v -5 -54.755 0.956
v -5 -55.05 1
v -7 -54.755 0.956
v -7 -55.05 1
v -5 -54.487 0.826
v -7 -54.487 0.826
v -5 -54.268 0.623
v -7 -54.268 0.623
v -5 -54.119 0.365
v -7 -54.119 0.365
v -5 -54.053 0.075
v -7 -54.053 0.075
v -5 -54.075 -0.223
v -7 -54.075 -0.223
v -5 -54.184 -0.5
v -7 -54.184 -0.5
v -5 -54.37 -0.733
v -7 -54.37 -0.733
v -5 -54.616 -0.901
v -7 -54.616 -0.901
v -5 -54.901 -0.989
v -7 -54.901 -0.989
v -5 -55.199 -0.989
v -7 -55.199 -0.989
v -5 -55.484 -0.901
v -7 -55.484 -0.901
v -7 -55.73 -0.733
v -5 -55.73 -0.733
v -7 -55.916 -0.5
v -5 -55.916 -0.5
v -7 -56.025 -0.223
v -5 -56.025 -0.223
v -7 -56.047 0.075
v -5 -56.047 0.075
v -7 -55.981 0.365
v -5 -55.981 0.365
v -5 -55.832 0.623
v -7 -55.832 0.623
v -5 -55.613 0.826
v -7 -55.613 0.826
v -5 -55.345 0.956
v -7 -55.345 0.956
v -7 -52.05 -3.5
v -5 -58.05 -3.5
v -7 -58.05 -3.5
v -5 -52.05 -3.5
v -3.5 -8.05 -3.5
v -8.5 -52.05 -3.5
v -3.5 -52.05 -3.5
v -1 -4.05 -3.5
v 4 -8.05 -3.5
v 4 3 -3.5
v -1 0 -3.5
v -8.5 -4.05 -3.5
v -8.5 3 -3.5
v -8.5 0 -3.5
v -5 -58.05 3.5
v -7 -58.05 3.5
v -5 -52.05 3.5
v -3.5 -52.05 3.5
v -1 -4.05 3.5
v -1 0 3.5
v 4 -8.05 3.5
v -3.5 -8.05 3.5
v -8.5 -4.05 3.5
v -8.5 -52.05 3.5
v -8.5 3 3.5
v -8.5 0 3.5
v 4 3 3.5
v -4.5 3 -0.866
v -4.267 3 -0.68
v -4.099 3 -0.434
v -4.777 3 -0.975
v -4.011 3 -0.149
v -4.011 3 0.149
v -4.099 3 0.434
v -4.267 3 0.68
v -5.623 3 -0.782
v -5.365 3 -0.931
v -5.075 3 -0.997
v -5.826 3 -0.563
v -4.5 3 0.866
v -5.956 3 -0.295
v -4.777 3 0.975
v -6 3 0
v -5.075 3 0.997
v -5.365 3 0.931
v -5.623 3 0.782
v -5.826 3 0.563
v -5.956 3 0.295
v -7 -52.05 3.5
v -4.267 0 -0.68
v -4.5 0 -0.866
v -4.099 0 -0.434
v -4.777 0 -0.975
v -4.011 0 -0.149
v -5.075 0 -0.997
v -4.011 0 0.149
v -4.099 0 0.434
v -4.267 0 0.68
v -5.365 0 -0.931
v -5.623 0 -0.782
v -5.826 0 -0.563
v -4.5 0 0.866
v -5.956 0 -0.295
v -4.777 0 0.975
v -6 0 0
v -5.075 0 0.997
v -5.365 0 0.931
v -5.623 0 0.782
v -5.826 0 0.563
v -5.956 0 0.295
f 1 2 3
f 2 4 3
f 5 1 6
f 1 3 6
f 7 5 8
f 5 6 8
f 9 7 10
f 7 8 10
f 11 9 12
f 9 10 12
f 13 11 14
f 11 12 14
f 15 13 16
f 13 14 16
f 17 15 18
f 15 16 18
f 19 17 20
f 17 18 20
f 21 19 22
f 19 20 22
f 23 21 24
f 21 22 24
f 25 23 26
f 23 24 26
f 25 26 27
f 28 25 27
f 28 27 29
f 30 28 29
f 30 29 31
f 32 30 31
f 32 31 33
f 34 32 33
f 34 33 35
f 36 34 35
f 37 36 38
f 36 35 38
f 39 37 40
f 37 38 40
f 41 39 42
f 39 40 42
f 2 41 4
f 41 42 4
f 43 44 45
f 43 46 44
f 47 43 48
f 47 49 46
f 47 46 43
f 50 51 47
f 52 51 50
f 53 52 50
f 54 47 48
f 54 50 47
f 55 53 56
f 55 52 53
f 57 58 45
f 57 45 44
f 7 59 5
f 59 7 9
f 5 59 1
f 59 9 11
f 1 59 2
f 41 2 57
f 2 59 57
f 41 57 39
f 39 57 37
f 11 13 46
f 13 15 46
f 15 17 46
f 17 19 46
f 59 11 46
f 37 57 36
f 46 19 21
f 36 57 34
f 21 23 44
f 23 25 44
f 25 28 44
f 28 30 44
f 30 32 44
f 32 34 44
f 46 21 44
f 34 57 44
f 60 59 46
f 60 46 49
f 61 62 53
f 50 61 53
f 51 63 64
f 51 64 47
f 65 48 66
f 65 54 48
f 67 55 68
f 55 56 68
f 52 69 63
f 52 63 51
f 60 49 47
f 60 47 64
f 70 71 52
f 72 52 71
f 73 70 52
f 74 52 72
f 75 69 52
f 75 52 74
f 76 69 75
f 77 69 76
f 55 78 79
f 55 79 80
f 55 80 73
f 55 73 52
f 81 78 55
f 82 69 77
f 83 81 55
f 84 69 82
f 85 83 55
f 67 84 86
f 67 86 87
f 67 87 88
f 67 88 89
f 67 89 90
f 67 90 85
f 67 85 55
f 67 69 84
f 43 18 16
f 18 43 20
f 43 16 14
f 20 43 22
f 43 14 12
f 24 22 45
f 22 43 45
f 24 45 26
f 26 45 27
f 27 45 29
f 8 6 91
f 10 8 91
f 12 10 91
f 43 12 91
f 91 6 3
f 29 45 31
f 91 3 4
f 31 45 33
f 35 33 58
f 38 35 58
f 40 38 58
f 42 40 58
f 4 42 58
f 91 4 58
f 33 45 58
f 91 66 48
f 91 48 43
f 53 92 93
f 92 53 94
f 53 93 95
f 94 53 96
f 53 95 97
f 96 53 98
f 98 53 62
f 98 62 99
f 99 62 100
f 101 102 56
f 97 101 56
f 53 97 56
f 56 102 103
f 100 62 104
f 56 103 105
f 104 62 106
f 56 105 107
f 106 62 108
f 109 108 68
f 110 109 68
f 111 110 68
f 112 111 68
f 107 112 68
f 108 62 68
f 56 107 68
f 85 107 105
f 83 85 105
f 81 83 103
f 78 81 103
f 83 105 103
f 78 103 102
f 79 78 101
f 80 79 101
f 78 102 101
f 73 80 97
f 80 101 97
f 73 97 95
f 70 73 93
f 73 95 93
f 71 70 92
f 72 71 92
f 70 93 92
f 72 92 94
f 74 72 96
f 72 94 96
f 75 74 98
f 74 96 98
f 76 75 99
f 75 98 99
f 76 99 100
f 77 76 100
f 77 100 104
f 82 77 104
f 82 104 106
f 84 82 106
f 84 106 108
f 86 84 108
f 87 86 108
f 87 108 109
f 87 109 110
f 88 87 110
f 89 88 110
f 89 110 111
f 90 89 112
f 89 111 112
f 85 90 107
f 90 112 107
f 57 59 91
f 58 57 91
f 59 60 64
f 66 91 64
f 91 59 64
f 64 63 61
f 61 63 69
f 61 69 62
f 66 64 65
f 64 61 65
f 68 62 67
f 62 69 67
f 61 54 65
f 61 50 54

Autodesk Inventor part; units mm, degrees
ref_plane "YZ Plane" through (0, 0, 0) normal (1, 0, 0) x (0, 1, 0)
ref_plane "XZ Plane" through (0, 0, 0) normal (0, 1, 0) x (-1, 0, 0)
ref_plane "XY Plane" through (0, 0, 0) normal (0, 0, 1) x (1, 0, 0)
sketch "Sketch1" plane through (0, 0, 0) normal (0, 1, 0) x (-1, 0, 0)
  line L0 (10, 3.5) -> (-4, 3.5)
  line L1 (-4, 3.5) -> (-4, -3.5)
  line L2 (-4, -3.5) -> (10, -3.5)
  line L3 (10, -3.5) -> (10, 3.5)
  line L4 (12.8, 0) -> (-6.8, 0) projected
  line L5 (0, -4.9) -> (0, 4.9) projected
  circle A0 centre (5, 0) radius 1
  dimension "d13" = 4
  dimension "d14" = 5
  dimension "d15" = 10
  dimension "d16" = 3.5
  dimension "d17" = 3.5
  dimension "d18" = 2
extrude "Extrusion4" add sketch "Sketch1" along normal blind 3 contours L3 L4 A0 L5 L0 | L5 L4 L1 L0 | L3 L2 L5 L4 A0 | L5 L2 L1 L4
sketch "Sketch3" plane through (0, 0, 0) normal (0, -1, 0) x (1, 0, 0)
  line L0 (4, -3.5) -> (-10, -3.5) projected
  line L1 (4, 3.5) -> (4, -3.5) projected
  line L2 (4, 3.5) -> (-1, 3.5)
  line L3 (-1, 3.5) -> (-1, -3.5)
  line L4 (-1, -3.5) -> (4, -3.5)
  line L5 (4, -3.5) -> (4, 3.5)
  point P0 (0, 0)
  dimension "d21" = 5
extrude "Extrusion5" add sketch "Sketch3" along normal blind 50
sketch "Sketch5" plane through (0, -50, 0) normal (0, -1, 0) x (1, 0, 0)
  line L0 (4, 3.5) -> (-1, 3.5) projected
  line L1 (-1, 3.5) -> (-1, -3.5) projected
  line L2 (-1, -3.5) -> (4, -3.5) projected
  line L3 (4, -3.5) -> (4, 3.5) projected
  line L4 (2.5, 3.5) -> (0.5, 3.5)
  line L5 (0.5, 3.5) -> (0.5, -3.5)
  line L6 (0.5, -3.5) -> (2.5, -3.5)
  line L7 (2.5, -3.5) -> (2.5, 3.5)
  point P0 (0, 0)
  dimension "d29" = 1.5
  dimension "d30" = 1.5
extrude "Extrusion7" add sketch "Sketch5" along normal blind 6 contours L7 L2 L5 L0
sketch "Sketch6" plane through (2.5, -50, 3.5) normal (1, 0, 0) x (0, 0, -1)
  circle A0 centre (3.5, -3) radius 1
  line L0 (7, 0) -> (0, 0) projected
  line L1 (0, 0) -> (0, -6) projected
  point P0 (3.5, 50)
  dimension "d34" = 2
  dimension "d35" = 3
  dimension "d36" = 3.5
extrude "Extrusion8" cut sketch "Sketch6" against normal through all
sketch "Sketch7" plane through (-1, 0, -3.5) normal (-1, 0, 0) x (0, 0, 1)
  line L0 (0, 0) -> (7, 0) projected
  line L1 (0, 0) -> (0, -50) projected
  line L2 (7, 0) -> (7, -50) projected
  line L3 (0, -4.05) -> (7, -4.05)
  line L4 (7, -4.05) -> (7, -8.05)
  line L5 (7, -8.05) -> (0, -8.05)
  line L6 (0, -8.05) -> (0, -4.05)
  point P0 (3.5, 0)
  dimension "d39" = 4.05
  dimension "d40" = 4
extrude "Extrusion9" add sketch "Sketch7" along normal blind 7.5 contours L3 L2 L5 L1
sketch "Sketch9" plane through (-1, -8.05, -3.5) normal (0, -1, 0) x (1, 0, 0)
  line L0 (0, 7) -> (-7.5, 7) projected
  line L1 (-7.5, 0) -> (-7.5, 7) projected
  line L2 (0, 0) -> (-7.5, 0) projected
  line L3 (-7.5, 0) -> (-2.5, 0)
  line L4 (-2.5, 0) -> (-2.5, 7)
  line L5 (-2.5, 7) -> (-7.5, 7)
  line L6 (-7.5, 7) -> (-7.5, 0)
  point P0 (1, 3.5)
  dimension "d43" = 5
extrude "Extrusion10" add sketch "Sketch9" along normal blind 50
sketch "Sketch10" plane through (-1, -50, -3.5) normal (-1, 0, 0) x (0, 0, 1)
  line L0 (7, 41.95) -> (0, 41.95) projected
  line L1 (0, 41.95) -> (0, 0) projected
  line L2 (7, 0) -> (0, 0) projected
  line L3 (7, 41.95) -> (7, 0) projected
  line L4 (0, 41.95) -> (10.2816, 41.95)
  line L5 (10.2816, 41.95) -> (10.2816, -15.7759)
  line L6 (10.2816, -15.7759) -> (0, -15.7759)
  line L7 (0, -15.7759) -> (0, 41.95)
  point P0 (3.5, 50)
extrude "Extrusion11" cut sketch "Sketch10" against normal blind 20
sketch "Sketch11" plane through (-1, -58.05, -3.5) normal (0, -1, 0) x (1, 0, 0)
  line L0 (-2.5, 7) -> (-7.5, 7) projected
  line L1 (-7.5, 7) -> (-7.5, 0) projected
  line L2 (-7.5, 0) -> (-2.5, 0) projected
  line L3 (-2.5, 0) -> (-2.5, 7) projected
  line L4 (-4, 0) -> (-6, 0)
  line L5 (-6, 0) -> (-6, 7)
  line L6 (-6, 7) -> (-4, 7)
  line L7 (-4, 7) -> (-4, 0)
  point P0 (1, 3.5)
  dimension "d48" = 1.5
  dimension "d49" = 1.5
extrude "Extrusion12" cut sketch "Sketch11" against normal blind 6 contours L3 L2 L7 L0 | L5 L2 L1 L0
sketch "Sketch12" plane through (-7, -58.05, -3.5) normal (-1, 0, 0) x (0, 0, 1)
  line L0 (7, 6) -> (7, 0) projected
  line L1 (7, 6) -> (0, 6) projected
  circle A0 centre (3.5, 3) radius 1
  point P0 (3.5, 58.05)
  dimension "d52" = 2
  dimension "d53" = 3.5
  dimension "d54" = 3
extrude "Extrusion13" cut sketch "Sketch12" against normal through all
thicken "Thicken1" operation add thickness 1 both sides no extend neighbours yes toward (1, 0, 0) faces at (-10, 1, -1.1667)
thicken "Thicken2" operation add thickness 0.5 both sides no extend neighbours yes toward (1, 0, 0) faces at (-9, 1, -1.1667)
properties part number "LD_holder_p3"
